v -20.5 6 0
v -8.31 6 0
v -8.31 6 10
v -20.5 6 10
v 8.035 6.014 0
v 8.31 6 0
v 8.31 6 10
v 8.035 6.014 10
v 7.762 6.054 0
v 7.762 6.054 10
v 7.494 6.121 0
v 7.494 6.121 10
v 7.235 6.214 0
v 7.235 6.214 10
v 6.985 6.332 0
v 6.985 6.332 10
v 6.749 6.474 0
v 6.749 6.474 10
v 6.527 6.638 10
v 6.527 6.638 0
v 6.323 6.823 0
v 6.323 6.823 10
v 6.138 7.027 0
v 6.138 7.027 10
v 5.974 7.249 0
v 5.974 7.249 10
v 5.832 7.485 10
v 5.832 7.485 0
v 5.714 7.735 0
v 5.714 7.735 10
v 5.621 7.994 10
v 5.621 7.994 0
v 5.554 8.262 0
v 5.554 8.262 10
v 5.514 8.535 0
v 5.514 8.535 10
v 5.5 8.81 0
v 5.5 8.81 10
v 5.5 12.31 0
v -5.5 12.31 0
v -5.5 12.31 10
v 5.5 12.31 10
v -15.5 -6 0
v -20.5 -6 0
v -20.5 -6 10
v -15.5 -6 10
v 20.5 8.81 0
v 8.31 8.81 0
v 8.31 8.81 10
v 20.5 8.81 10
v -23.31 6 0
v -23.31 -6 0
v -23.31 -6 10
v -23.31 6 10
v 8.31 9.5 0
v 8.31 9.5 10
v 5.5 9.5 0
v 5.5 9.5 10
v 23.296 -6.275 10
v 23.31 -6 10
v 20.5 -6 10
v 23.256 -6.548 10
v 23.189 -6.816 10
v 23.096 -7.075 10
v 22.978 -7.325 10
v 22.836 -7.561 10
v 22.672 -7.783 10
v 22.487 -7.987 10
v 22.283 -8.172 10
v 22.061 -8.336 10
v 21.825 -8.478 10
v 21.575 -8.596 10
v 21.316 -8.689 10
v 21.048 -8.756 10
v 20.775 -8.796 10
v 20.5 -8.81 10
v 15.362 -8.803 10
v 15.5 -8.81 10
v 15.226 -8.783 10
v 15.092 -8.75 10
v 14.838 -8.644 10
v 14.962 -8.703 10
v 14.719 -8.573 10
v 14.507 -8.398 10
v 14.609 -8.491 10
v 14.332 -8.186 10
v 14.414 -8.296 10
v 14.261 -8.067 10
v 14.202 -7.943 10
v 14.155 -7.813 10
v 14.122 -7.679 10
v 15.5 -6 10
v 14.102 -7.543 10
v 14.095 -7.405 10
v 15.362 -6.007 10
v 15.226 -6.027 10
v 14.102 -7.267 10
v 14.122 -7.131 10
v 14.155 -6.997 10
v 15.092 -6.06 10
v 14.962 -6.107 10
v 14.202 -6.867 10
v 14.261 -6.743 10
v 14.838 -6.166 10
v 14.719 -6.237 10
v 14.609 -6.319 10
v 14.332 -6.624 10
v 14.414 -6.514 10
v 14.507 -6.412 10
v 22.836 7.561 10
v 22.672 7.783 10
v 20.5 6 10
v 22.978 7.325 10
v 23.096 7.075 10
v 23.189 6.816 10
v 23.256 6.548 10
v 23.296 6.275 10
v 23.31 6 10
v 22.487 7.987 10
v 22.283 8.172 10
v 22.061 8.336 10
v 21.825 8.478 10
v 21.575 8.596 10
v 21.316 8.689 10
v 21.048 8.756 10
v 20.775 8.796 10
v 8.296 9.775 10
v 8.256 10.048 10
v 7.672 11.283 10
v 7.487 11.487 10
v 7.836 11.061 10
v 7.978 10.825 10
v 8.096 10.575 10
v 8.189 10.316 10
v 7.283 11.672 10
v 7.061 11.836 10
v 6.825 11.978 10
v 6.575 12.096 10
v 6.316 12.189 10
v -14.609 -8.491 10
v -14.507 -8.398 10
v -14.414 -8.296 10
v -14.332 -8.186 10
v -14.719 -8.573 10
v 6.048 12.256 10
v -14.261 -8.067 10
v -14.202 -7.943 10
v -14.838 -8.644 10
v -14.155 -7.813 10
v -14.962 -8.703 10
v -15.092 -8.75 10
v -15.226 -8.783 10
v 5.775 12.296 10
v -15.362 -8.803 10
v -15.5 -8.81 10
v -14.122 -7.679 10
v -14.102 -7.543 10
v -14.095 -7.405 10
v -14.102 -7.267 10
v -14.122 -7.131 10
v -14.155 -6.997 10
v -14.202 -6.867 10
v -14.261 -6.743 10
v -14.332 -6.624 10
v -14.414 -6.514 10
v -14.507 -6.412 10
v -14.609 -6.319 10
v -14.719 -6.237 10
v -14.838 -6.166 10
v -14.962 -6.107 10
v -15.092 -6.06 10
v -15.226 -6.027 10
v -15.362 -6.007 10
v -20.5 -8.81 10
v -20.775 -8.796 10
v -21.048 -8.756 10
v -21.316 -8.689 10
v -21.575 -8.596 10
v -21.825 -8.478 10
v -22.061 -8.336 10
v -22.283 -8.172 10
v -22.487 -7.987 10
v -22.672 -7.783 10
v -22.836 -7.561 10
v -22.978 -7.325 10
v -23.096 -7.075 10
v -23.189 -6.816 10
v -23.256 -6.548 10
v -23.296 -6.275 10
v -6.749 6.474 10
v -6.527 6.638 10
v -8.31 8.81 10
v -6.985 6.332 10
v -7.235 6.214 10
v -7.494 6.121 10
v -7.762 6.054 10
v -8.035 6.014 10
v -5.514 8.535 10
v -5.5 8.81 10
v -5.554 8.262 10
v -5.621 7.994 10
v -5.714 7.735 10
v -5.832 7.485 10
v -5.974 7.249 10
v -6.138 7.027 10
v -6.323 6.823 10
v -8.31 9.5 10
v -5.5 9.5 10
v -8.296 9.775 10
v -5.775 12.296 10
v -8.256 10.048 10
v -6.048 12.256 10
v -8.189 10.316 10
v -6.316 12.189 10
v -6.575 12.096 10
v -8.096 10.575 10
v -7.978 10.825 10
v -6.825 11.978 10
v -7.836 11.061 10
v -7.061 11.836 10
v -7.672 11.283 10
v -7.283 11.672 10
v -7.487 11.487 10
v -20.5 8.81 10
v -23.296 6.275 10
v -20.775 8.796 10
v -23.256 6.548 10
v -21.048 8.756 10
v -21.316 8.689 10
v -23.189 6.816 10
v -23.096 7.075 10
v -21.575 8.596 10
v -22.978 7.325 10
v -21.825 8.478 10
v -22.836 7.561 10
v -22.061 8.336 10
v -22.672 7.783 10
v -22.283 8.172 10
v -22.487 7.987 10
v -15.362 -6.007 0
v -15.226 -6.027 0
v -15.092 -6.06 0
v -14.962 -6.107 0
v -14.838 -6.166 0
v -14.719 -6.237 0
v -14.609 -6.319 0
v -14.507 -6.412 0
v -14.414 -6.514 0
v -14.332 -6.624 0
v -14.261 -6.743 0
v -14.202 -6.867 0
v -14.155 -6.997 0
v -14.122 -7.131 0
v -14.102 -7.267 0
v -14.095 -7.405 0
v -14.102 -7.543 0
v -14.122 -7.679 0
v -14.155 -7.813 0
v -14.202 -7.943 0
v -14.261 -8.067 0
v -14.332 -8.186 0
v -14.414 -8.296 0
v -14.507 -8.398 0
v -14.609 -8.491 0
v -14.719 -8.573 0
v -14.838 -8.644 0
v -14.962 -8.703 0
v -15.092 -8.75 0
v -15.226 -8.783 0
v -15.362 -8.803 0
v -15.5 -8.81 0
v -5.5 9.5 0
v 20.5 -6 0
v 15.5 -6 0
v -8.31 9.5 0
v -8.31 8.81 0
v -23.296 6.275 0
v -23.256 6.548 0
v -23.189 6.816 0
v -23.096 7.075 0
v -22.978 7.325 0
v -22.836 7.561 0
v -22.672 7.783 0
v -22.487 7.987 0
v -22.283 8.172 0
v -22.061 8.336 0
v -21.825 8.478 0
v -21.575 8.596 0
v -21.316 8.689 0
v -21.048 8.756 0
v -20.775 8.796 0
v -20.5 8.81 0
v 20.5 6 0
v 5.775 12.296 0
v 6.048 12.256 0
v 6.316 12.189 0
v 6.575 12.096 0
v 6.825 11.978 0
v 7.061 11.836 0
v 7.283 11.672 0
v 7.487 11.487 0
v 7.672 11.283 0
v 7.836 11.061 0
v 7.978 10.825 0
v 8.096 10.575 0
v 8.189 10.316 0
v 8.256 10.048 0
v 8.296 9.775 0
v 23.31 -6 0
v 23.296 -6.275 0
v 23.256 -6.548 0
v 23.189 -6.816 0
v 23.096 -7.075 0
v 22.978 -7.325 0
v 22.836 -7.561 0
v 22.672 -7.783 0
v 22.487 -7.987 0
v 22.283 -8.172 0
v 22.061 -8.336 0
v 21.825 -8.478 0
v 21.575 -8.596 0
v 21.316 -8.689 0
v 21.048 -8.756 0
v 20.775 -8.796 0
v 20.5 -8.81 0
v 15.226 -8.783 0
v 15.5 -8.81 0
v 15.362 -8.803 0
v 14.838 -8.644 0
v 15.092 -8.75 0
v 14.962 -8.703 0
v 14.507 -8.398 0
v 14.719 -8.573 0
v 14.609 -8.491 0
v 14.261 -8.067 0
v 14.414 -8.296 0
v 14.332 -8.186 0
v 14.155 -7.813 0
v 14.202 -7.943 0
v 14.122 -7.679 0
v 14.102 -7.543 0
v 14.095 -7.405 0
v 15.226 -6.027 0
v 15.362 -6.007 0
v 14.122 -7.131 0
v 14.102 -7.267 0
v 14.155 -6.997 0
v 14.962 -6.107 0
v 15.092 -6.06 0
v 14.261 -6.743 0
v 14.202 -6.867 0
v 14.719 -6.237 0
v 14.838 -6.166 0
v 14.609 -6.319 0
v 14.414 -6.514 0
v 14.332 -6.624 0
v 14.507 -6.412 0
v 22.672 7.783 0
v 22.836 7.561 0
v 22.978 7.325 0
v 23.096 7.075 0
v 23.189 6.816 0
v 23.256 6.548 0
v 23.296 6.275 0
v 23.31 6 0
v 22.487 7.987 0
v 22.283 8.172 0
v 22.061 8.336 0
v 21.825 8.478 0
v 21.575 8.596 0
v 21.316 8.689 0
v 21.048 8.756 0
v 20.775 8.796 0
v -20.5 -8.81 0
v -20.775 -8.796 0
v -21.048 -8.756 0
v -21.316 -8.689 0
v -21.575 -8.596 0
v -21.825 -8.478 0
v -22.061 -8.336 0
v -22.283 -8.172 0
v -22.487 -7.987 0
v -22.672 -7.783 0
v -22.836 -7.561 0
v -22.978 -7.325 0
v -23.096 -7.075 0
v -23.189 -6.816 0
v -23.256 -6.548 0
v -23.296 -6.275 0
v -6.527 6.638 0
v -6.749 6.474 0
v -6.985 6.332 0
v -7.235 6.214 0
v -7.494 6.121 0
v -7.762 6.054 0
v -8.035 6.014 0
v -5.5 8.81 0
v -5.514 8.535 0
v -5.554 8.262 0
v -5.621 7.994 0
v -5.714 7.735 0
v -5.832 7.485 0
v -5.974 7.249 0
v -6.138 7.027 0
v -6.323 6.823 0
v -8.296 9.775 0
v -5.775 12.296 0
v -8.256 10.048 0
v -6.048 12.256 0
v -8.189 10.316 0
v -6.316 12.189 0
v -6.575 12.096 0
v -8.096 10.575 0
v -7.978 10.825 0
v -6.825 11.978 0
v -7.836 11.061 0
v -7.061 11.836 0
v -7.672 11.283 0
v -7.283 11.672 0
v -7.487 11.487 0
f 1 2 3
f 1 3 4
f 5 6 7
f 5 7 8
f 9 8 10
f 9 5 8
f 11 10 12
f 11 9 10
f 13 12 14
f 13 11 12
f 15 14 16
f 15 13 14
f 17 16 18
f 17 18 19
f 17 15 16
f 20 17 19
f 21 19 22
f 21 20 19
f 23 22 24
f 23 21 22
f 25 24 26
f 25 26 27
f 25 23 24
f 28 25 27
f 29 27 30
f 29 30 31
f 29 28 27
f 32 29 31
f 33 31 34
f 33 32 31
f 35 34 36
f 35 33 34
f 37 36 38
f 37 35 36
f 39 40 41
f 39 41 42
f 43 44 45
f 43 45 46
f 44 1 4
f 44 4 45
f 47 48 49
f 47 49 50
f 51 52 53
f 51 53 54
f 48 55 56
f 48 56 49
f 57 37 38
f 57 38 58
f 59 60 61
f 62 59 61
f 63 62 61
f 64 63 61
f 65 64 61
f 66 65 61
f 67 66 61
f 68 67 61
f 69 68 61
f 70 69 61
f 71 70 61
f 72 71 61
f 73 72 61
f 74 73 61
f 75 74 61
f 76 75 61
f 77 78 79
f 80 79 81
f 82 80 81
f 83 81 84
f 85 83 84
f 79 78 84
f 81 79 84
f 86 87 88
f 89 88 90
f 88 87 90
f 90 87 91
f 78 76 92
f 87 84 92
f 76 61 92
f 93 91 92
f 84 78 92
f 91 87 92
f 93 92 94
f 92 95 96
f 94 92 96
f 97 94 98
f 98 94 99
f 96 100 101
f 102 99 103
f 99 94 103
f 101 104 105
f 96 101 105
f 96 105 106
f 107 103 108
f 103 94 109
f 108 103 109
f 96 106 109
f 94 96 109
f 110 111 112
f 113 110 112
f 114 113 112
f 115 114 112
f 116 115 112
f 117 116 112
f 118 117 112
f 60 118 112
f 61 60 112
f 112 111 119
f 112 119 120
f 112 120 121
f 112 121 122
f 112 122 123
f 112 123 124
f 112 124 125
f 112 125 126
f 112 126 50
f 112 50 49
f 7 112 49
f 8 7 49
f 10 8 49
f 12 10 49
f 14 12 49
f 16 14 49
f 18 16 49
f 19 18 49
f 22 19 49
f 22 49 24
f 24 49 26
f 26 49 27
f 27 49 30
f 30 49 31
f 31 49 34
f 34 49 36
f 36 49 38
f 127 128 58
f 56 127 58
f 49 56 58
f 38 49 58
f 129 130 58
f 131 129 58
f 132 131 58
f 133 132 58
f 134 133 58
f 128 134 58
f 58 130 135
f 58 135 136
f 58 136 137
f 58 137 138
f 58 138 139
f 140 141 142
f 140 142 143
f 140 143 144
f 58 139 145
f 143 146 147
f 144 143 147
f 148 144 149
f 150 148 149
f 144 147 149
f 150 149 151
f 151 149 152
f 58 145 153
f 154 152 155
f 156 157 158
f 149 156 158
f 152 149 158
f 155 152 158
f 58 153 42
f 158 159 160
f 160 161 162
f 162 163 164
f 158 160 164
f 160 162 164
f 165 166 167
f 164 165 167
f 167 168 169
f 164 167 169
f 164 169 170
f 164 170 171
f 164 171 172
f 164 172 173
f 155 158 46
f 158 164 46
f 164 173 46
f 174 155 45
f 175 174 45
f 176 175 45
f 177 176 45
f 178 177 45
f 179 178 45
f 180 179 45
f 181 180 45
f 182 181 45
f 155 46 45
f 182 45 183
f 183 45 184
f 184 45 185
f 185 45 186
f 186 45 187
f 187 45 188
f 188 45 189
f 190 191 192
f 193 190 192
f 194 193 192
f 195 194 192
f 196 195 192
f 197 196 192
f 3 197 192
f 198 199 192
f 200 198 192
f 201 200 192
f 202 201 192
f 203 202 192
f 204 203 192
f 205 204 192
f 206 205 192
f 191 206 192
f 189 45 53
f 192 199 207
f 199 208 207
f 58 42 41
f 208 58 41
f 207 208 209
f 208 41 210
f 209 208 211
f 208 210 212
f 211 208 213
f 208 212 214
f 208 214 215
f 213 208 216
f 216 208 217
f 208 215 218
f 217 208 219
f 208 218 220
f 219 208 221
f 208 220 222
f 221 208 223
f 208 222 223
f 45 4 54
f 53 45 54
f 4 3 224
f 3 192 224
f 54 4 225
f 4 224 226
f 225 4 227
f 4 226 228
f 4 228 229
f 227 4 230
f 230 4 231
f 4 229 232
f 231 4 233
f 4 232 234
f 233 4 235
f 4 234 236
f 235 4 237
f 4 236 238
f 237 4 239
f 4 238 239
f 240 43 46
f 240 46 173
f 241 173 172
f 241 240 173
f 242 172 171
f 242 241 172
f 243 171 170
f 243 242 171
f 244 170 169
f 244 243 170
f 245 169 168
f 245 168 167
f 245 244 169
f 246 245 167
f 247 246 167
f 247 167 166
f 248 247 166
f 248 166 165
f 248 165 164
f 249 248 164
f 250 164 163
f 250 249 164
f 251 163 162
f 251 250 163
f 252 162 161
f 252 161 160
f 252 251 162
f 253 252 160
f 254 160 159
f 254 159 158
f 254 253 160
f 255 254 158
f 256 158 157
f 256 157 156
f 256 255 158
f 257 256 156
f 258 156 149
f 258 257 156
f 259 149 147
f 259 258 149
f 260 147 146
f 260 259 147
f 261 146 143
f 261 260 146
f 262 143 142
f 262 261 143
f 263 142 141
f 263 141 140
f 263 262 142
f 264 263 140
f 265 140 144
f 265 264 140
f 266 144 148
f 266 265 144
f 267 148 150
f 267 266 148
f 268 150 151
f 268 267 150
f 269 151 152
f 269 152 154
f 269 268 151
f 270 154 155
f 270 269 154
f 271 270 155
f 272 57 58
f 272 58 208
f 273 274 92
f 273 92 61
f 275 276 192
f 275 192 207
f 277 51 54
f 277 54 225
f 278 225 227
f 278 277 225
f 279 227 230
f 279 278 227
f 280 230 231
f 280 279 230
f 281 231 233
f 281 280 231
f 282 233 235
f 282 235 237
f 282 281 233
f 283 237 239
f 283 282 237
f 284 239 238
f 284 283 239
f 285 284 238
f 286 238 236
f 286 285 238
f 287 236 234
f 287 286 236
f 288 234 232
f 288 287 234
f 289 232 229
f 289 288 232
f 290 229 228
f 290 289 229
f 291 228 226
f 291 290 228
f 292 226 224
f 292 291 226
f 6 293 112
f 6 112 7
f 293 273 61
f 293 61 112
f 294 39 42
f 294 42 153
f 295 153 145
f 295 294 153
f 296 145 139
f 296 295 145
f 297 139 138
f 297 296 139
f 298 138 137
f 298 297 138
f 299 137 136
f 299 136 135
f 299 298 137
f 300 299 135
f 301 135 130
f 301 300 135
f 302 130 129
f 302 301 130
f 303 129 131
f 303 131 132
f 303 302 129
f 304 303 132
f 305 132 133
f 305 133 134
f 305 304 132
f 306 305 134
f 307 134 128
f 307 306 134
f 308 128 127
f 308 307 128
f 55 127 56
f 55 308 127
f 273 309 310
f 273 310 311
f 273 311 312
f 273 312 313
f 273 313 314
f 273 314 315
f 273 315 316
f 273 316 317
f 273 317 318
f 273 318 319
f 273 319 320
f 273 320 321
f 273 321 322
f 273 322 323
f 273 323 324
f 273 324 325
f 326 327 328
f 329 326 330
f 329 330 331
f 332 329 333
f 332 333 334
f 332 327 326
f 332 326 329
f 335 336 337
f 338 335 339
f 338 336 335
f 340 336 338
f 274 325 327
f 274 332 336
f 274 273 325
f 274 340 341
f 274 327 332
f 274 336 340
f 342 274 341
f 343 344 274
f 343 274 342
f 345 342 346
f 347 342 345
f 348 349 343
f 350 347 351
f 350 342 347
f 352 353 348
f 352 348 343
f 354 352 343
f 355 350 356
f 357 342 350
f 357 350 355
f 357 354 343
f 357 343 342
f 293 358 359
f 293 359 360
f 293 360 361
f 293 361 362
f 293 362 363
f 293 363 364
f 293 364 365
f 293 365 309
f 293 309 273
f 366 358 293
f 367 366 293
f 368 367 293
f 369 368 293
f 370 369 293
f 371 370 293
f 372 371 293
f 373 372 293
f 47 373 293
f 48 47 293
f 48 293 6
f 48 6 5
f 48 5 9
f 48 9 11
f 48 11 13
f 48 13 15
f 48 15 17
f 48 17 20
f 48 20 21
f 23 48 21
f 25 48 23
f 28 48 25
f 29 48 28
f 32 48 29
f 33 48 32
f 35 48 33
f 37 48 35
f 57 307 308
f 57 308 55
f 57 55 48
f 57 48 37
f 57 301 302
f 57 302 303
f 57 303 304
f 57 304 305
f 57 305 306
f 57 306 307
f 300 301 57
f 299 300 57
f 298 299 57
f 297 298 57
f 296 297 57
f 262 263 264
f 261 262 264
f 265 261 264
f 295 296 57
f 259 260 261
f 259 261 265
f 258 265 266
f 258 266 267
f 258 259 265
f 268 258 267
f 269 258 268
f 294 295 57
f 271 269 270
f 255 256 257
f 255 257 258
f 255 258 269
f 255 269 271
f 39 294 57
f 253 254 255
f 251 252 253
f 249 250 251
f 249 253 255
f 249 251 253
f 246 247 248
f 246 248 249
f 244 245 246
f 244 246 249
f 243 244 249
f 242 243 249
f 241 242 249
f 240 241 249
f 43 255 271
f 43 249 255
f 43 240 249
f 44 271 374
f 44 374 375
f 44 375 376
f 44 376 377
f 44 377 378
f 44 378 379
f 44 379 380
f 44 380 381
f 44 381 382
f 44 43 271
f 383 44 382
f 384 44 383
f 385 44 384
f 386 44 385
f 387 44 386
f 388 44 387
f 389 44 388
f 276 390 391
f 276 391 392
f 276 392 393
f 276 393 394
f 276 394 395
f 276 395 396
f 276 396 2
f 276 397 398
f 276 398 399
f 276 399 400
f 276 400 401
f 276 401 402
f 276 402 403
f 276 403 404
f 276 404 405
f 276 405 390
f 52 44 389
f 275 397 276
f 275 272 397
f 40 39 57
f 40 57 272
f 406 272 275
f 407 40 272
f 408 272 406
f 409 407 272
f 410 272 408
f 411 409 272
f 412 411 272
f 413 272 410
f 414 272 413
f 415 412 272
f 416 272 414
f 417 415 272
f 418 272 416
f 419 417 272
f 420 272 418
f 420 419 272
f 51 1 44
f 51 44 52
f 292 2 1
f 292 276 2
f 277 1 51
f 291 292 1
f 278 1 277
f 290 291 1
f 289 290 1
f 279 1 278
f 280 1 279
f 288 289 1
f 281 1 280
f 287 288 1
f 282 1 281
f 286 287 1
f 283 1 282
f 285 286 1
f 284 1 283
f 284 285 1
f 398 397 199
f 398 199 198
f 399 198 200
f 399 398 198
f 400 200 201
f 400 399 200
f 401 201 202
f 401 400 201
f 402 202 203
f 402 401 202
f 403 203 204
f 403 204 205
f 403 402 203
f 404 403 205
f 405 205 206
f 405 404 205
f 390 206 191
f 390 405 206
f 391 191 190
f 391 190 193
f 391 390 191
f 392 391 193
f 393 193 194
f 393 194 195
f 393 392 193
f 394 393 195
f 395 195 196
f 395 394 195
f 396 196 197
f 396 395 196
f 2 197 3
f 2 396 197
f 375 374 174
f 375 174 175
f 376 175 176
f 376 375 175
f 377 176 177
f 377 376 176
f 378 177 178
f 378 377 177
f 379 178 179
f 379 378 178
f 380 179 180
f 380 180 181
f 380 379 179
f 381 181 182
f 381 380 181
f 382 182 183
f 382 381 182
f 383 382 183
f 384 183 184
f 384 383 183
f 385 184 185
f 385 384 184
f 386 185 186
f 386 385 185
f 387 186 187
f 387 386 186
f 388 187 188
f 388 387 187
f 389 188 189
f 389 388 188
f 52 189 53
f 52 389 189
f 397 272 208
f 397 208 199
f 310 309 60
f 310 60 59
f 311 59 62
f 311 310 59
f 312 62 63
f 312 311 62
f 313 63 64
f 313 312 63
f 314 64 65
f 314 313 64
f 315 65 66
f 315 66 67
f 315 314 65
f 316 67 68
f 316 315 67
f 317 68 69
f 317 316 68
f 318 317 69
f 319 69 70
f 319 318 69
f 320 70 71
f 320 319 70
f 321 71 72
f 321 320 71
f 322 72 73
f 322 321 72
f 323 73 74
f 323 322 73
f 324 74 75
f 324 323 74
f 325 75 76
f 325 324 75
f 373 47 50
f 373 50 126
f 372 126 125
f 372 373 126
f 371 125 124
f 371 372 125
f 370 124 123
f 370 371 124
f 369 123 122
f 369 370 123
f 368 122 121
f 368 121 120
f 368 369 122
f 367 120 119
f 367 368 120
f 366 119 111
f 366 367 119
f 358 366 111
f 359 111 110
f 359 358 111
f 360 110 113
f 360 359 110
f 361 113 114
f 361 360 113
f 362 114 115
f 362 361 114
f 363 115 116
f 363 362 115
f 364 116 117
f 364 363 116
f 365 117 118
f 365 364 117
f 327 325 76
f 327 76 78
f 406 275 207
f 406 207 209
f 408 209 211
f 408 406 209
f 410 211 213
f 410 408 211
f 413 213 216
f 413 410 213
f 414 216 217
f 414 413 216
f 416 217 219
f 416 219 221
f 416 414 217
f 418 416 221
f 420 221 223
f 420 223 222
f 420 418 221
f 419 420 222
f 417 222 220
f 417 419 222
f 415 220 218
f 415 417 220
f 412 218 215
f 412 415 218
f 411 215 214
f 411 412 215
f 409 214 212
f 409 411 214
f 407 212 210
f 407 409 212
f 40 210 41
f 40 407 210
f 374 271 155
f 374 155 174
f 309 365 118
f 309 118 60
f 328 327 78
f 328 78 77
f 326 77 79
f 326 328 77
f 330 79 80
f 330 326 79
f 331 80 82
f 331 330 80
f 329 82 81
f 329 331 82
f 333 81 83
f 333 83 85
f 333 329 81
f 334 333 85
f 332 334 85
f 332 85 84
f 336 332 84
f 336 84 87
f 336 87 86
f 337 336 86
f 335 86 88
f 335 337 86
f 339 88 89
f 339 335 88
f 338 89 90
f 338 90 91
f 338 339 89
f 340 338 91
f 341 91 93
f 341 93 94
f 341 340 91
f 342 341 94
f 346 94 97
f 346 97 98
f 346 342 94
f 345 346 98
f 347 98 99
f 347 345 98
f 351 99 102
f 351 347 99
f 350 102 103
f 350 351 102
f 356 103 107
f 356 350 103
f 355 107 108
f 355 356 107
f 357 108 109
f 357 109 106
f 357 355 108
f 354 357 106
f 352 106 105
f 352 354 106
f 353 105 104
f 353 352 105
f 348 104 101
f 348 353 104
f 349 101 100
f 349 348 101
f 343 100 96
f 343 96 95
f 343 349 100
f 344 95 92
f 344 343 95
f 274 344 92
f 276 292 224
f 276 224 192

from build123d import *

# Parameters (mm, degrees)
BOSS_EXTRUDE1_DEPTH = 10


with BuildPart() as part:
    # Sketch1 → Boss-Extrude1 (new body)
    with BuildSketch(Plane.XY):
        with BuildLine():
            Line((-20.5, -6), (-15.5, -6))
            ThreePointArc((-15.5, -6), (-14.095, -7.405), (-15.5, -8.81))
            Line((-15.5, -8.81), (-20.5, -8.81))
            ThreePointArc((-20.5, -8.81), (-22.486970055, -7.986970055), (-23.31, -6))
            Line((-23.31, -6), (-23.31, 6))
            ThreePointArc((-23.31, 6), (-22.486970055, 7.986970055), (-20.5, 8.81))
            Line((-20.5, 8.81), (-8.31, 8.81))
            Line((-8.31, 8.81), (-8.31, 9.5))
            ThreePointArc((-8.31, 9.5), (-7.486970055, 11.486970055), (-5.5, 12.31))
            Line((-5.5, 12.31), (5.5, 12.31))
            ThreePointArc((5.5, 12.31), (7.486970055, 11.486970055), (8.31, 9.5))
            Line((8.31, 9.5), (8.31, 8.81))
            Line((8.31, 8.81), (20.5, 8.81))
            ThreePointArc((20.5, 8.81), (22.486970055, 7.986970055), (23.31, 6))
            Line((23.31, 6), (23.31, -6))
            ThreePointArc((23.31, -6), (22.486970055, -7.986970055), (20.5, -8.81))
            Line((20.5, -8.81), (15.5, -8.81))
            ThreePointArc((15.5, -8.81), (14.095, -7.405), (15.5, -6))
            Line((15.5, -6), (20.5, -6))
            Line((20.5, -6), (20.5, 6))
            Line((20.5, 6), (8.31, 6))
            ThreePointArc((8.31, 6), (6.323029945, 6.823029945), (5.5, 8.81))
            Line((5.5, 8.81), (5.5, 9.5))
            Line((5.5, 9.5), (-5.5, 9.5))
            Line((-5.5, 9.5), (-5.5, 8.81))
            ThreePointArc((-5.5, 8.81), (-6.323029945, 6.823029945), (-8.31, 6))
            Line((-8.31, 6), (-20.5, 6))
            Line((-20.5, 6), (-20.5, -6))
        make_face()
    extrude(amount=BOSS_EXTRUDE1_DEPTH)


solid = part.part
